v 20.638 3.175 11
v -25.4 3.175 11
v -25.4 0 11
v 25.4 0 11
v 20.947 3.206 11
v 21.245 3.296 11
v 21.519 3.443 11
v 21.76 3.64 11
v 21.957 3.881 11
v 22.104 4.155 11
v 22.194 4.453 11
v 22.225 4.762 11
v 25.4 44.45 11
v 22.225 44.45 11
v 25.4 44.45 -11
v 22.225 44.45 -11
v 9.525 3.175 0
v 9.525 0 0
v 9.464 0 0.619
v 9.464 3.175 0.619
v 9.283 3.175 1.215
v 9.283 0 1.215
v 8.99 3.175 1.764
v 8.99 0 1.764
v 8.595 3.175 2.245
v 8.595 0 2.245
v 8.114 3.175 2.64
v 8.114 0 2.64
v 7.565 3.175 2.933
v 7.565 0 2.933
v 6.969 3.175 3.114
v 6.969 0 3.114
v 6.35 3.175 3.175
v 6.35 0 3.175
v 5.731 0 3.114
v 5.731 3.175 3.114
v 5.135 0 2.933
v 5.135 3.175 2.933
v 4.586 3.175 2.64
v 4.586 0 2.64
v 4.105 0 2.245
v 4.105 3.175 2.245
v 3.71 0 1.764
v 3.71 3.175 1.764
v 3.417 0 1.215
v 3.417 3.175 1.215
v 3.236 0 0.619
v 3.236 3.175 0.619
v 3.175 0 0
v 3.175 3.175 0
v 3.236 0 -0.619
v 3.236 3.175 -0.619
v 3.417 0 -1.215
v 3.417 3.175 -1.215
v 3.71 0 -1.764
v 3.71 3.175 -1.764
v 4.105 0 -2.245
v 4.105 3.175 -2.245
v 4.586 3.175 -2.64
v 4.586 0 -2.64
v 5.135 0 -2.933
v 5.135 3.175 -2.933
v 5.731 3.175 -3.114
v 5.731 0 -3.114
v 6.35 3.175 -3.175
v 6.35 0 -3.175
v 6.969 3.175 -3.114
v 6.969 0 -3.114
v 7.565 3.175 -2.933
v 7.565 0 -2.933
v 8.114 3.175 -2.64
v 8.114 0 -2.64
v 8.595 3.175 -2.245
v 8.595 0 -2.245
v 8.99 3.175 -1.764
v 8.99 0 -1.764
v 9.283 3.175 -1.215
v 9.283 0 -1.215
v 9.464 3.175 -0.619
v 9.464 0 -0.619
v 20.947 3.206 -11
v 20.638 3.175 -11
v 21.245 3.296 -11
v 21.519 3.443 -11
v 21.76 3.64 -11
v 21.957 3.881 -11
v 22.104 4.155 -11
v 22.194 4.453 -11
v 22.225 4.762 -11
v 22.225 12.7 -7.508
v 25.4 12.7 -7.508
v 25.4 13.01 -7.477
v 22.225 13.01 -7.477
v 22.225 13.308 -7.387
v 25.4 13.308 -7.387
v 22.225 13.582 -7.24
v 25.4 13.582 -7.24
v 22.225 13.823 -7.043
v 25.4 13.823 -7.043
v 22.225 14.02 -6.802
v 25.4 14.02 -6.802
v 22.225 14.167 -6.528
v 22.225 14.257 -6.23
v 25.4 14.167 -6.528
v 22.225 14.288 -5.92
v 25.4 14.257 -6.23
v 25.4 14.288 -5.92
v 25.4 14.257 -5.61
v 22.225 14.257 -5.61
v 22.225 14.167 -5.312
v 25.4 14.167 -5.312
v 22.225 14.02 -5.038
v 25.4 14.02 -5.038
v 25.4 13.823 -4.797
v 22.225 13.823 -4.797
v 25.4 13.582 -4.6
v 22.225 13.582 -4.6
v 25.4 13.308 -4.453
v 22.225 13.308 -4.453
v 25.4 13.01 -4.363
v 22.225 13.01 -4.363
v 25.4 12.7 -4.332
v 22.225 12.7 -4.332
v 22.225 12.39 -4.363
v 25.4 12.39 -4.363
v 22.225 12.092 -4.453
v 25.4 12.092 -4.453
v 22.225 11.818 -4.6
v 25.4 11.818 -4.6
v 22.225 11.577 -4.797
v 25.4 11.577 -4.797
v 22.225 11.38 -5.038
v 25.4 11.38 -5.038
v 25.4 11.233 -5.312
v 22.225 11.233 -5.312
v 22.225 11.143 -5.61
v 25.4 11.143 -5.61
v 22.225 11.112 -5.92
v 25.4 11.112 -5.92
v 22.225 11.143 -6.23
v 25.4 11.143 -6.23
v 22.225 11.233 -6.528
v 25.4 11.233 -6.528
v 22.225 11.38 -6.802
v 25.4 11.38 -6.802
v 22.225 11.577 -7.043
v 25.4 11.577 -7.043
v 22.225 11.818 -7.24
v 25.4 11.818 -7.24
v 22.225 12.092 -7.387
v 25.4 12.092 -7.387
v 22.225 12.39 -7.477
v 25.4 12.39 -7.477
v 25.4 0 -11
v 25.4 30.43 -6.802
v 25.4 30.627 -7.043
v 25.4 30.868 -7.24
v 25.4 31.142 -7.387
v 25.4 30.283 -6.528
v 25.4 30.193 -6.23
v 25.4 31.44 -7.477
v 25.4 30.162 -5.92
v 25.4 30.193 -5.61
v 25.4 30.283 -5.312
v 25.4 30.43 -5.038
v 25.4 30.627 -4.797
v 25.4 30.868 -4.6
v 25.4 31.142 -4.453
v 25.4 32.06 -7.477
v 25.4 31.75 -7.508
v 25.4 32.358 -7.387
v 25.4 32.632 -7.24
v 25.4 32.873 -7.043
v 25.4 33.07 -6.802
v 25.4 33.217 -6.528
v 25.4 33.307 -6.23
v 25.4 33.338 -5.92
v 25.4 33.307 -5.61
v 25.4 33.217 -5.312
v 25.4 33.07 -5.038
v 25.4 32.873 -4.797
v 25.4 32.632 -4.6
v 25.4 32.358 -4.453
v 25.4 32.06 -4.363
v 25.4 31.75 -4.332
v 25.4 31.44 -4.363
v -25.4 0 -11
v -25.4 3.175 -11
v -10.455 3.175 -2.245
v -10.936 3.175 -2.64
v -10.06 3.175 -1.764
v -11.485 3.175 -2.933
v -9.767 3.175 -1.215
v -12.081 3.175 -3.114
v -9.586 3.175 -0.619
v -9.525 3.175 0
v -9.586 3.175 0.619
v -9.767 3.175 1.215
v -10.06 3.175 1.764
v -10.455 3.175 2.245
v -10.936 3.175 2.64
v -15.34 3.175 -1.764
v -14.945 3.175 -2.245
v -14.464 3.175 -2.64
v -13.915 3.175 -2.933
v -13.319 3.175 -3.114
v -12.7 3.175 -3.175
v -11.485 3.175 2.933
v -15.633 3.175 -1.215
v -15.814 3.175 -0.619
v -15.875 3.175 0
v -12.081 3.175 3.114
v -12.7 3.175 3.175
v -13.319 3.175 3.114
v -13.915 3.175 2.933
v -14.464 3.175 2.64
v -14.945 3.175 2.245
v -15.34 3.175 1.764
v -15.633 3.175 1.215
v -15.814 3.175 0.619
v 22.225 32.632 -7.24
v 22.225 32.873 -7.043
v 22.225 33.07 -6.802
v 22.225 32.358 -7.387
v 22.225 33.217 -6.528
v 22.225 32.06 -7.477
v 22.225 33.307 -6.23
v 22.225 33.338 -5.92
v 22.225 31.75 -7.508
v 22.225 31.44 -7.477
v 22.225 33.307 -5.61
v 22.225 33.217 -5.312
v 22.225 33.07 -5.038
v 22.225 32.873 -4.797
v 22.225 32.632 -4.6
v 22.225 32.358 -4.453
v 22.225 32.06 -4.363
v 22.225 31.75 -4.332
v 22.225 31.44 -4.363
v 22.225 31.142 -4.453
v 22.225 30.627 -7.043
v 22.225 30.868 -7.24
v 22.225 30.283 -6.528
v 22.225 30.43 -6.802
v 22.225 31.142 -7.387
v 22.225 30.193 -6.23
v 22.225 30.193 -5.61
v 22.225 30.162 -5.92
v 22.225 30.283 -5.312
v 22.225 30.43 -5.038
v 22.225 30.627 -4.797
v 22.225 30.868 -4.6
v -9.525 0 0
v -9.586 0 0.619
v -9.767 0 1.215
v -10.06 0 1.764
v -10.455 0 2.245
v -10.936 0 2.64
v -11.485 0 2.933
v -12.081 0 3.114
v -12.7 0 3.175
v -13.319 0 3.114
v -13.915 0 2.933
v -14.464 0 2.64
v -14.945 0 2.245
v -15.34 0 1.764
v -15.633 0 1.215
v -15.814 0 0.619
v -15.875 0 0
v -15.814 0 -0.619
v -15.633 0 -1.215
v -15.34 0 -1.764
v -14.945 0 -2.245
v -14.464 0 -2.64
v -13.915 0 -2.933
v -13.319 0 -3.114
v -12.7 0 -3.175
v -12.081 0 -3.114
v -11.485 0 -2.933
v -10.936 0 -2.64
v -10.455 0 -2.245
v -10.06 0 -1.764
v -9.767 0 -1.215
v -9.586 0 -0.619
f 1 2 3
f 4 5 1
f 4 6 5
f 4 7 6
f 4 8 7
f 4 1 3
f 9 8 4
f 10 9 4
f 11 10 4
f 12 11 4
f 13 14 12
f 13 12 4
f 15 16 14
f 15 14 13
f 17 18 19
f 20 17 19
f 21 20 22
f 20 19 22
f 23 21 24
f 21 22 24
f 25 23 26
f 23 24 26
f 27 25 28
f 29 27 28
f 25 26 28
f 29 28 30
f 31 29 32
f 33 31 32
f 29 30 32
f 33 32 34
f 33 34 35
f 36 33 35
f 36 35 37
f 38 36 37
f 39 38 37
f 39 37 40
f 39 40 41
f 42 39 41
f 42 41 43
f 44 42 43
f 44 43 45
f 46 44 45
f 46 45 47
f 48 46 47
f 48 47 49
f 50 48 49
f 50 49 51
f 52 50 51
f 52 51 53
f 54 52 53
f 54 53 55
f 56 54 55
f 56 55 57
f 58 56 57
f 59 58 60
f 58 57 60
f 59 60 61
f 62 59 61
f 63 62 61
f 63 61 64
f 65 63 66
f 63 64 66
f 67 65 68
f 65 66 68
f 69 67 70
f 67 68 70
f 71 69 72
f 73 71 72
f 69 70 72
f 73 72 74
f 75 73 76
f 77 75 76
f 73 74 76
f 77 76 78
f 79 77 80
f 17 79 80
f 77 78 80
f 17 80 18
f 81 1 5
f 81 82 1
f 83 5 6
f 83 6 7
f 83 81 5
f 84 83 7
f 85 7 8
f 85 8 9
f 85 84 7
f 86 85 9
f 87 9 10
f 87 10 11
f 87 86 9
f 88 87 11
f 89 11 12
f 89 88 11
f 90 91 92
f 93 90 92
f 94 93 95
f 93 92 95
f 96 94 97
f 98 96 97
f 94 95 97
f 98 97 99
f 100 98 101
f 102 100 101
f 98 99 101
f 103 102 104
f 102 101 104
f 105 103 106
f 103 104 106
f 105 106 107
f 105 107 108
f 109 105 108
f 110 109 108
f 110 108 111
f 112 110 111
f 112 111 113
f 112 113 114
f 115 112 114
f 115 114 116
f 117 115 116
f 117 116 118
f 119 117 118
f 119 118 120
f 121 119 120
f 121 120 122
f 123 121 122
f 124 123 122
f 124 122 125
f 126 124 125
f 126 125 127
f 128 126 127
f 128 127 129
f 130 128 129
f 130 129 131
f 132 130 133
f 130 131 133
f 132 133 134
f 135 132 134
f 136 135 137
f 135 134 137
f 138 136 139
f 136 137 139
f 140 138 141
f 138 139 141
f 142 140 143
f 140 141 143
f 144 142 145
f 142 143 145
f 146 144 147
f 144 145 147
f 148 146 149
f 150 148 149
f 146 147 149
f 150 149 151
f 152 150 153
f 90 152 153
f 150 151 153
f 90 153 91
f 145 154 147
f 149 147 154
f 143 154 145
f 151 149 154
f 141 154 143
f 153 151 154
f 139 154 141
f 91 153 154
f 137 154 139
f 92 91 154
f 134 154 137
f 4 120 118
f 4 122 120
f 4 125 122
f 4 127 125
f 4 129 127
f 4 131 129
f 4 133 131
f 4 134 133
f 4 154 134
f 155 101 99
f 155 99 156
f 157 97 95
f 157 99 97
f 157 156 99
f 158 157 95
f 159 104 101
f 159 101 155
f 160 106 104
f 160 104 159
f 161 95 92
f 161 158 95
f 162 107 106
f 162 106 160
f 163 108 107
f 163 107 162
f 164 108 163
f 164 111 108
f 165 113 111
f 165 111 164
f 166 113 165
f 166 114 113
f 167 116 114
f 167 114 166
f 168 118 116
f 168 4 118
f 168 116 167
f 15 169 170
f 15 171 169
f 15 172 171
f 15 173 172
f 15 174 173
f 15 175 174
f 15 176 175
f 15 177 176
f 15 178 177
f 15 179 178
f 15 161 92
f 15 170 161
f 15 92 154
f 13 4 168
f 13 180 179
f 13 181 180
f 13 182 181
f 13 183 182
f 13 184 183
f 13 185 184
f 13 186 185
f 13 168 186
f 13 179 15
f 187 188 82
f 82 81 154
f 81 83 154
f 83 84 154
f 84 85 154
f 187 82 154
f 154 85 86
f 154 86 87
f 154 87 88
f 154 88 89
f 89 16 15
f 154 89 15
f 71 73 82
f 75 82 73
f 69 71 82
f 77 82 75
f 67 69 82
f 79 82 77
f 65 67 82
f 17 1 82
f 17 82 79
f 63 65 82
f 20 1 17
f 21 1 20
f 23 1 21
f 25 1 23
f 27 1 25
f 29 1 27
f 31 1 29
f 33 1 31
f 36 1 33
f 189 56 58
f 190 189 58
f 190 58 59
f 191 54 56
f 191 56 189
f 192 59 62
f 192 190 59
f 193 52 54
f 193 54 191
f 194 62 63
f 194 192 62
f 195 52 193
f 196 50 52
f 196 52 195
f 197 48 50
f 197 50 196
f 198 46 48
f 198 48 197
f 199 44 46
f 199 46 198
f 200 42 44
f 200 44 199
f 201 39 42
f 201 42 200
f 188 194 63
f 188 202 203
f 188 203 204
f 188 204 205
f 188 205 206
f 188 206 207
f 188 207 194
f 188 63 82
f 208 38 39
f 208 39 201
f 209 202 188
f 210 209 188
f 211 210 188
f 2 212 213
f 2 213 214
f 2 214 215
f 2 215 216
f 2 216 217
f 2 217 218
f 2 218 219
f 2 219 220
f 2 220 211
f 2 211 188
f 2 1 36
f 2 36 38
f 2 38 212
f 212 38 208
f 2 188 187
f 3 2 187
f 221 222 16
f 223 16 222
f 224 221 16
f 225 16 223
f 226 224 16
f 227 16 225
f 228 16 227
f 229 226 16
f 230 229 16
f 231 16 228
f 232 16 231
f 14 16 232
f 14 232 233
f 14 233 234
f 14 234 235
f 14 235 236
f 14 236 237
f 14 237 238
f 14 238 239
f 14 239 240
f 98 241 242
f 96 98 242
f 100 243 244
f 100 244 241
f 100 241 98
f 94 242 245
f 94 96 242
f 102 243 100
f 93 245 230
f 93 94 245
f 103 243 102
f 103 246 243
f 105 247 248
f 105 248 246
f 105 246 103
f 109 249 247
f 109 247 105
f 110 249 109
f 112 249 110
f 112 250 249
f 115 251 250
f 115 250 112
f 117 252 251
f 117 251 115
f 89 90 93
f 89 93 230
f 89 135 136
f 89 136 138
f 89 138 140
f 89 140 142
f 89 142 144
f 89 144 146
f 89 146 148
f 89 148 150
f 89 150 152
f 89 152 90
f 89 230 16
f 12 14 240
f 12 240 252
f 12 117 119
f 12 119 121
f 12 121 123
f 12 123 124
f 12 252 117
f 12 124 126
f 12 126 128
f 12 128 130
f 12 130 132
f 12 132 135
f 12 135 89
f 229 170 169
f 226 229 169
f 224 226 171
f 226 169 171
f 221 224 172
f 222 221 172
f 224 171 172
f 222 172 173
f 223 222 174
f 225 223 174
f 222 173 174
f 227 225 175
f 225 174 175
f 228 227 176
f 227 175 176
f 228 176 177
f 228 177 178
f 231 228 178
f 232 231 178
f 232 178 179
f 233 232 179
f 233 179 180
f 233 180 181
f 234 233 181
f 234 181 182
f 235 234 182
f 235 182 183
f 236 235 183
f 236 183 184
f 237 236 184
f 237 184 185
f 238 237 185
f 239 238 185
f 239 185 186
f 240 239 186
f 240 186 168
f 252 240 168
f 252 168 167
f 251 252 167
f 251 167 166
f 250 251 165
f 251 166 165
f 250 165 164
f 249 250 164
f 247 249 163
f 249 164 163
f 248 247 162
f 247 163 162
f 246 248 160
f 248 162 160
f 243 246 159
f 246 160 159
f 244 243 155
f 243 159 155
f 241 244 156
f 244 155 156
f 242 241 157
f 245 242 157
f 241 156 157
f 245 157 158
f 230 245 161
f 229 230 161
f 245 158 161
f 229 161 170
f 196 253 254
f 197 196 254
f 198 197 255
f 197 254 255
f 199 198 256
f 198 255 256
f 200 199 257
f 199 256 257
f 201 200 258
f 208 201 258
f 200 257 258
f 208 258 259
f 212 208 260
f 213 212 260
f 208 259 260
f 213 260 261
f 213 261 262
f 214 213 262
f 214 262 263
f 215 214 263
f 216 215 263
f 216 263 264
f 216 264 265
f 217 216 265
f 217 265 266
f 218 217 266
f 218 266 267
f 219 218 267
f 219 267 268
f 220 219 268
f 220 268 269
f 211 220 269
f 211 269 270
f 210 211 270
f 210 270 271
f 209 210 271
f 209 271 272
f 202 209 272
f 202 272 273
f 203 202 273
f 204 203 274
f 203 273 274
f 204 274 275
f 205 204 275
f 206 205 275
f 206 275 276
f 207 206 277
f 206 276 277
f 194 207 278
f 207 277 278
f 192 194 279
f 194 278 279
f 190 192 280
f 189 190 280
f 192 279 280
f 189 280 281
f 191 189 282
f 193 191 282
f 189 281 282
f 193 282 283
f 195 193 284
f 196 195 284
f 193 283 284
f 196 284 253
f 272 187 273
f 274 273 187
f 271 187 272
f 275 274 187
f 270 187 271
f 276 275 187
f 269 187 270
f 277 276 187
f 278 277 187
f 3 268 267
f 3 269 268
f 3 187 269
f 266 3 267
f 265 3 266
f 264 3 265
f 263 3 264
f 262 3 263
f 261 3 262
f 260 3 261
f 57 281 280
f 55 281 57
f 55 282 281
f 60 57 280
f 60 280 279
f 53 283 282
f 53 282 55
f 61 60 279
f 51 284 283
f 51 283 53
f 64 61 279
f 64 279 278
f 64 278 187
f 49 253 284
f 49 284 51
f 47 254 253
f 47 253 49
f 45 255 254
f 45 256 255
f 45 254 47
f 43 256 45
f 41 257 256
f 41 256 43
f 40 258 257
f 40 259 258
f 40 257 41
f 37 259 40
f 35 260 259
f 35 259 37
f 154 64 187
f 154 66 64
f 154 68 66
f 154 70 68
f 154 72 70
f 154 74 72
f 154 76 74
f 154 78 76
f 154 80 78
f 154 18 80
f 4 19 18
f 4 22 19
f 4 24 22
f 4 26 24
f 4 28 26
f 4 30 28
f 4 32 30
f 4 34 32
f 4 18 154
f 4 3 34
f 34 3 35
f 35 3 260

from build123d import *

# Parameters (mm, degrees)
BOSS_EXTRUDE1_DEPTH = 11
FILLET1_R           = 1.5875
SKETCH3_W           = 24.423912887
SKETCH3_H           = 26.552361768
CUT_EXTRUDE1_DEPTH  = 23
SKETCH4_R           = 3.175
CUT_EXTRUDE2_DEPTH  = 45.45
SKETCH5_R           = 1.5875
CUT_EXTRUDE3_DEPTH  = 51.8


with BuildPart() as part:
    # Sketch2 → Boss-Extrude1 (new body, symmetric)
    with BuildSketch(Plane.XY):
        Polygon((-25.4, 0), (25.4, 0), (25.4, 50.8), (22.225, 50.8), (22.225, 3.175), (-25.4, 3.175), align=None)
    extrude(amount=BOSS_EXTRUDE1_DEPTH, both=True)

    # Fillet1
    fillet1_edges = [part.edges().sort_by_distance(p)[0] for p in [
        (22.225, 3.175, 0),
    ]]
    fillet(fillet1_edges, radius=FILLET1_R)

    # Sketch3 → Cut-Extrude1 (cut, through all)
    with BuildSketch(Plane.XY.offset(11)):
        with Locations((18.271034128, 57.726180884)):
            Rectangle(SKETCH3_W, SKETCH3_H)
    extrude(amount=-CUT_EXTRUDE1_DEPTH, mode=Mode.SUBTRACT)

    # Sketch4 → Cut-Extrude2 (cut, through all)
    with BuildSketch(Plane.XZ):
        with Locations((-12.7, 0)):
            Circle(SKETCH4_R)
        with Locations((6.35, 0)):
            Circle(SKETCH4_R)
    extrude(amount=-CUT_EXTRUDE2_DEPTH, mode=Mode.SUBTRACT)

    # Sketch5 → Cut-Extrude3 (cut, through all)
    with BuildSketch(Plane(origin=(25.4, 0, 0), x_dir=(0, 0, -1), z_dir=(1, 0, 0))):
        with Locations((5.92, 31.75)):
            Circle(SKETCH5_R)
        with Locations((5.92, 12.7)):
            Circle(SKETCH5_R)
    extrude(amount=-CUT_EXTRUDE3_DEPTH, mode=Mode.SUBTRACT)


solid = part.part
